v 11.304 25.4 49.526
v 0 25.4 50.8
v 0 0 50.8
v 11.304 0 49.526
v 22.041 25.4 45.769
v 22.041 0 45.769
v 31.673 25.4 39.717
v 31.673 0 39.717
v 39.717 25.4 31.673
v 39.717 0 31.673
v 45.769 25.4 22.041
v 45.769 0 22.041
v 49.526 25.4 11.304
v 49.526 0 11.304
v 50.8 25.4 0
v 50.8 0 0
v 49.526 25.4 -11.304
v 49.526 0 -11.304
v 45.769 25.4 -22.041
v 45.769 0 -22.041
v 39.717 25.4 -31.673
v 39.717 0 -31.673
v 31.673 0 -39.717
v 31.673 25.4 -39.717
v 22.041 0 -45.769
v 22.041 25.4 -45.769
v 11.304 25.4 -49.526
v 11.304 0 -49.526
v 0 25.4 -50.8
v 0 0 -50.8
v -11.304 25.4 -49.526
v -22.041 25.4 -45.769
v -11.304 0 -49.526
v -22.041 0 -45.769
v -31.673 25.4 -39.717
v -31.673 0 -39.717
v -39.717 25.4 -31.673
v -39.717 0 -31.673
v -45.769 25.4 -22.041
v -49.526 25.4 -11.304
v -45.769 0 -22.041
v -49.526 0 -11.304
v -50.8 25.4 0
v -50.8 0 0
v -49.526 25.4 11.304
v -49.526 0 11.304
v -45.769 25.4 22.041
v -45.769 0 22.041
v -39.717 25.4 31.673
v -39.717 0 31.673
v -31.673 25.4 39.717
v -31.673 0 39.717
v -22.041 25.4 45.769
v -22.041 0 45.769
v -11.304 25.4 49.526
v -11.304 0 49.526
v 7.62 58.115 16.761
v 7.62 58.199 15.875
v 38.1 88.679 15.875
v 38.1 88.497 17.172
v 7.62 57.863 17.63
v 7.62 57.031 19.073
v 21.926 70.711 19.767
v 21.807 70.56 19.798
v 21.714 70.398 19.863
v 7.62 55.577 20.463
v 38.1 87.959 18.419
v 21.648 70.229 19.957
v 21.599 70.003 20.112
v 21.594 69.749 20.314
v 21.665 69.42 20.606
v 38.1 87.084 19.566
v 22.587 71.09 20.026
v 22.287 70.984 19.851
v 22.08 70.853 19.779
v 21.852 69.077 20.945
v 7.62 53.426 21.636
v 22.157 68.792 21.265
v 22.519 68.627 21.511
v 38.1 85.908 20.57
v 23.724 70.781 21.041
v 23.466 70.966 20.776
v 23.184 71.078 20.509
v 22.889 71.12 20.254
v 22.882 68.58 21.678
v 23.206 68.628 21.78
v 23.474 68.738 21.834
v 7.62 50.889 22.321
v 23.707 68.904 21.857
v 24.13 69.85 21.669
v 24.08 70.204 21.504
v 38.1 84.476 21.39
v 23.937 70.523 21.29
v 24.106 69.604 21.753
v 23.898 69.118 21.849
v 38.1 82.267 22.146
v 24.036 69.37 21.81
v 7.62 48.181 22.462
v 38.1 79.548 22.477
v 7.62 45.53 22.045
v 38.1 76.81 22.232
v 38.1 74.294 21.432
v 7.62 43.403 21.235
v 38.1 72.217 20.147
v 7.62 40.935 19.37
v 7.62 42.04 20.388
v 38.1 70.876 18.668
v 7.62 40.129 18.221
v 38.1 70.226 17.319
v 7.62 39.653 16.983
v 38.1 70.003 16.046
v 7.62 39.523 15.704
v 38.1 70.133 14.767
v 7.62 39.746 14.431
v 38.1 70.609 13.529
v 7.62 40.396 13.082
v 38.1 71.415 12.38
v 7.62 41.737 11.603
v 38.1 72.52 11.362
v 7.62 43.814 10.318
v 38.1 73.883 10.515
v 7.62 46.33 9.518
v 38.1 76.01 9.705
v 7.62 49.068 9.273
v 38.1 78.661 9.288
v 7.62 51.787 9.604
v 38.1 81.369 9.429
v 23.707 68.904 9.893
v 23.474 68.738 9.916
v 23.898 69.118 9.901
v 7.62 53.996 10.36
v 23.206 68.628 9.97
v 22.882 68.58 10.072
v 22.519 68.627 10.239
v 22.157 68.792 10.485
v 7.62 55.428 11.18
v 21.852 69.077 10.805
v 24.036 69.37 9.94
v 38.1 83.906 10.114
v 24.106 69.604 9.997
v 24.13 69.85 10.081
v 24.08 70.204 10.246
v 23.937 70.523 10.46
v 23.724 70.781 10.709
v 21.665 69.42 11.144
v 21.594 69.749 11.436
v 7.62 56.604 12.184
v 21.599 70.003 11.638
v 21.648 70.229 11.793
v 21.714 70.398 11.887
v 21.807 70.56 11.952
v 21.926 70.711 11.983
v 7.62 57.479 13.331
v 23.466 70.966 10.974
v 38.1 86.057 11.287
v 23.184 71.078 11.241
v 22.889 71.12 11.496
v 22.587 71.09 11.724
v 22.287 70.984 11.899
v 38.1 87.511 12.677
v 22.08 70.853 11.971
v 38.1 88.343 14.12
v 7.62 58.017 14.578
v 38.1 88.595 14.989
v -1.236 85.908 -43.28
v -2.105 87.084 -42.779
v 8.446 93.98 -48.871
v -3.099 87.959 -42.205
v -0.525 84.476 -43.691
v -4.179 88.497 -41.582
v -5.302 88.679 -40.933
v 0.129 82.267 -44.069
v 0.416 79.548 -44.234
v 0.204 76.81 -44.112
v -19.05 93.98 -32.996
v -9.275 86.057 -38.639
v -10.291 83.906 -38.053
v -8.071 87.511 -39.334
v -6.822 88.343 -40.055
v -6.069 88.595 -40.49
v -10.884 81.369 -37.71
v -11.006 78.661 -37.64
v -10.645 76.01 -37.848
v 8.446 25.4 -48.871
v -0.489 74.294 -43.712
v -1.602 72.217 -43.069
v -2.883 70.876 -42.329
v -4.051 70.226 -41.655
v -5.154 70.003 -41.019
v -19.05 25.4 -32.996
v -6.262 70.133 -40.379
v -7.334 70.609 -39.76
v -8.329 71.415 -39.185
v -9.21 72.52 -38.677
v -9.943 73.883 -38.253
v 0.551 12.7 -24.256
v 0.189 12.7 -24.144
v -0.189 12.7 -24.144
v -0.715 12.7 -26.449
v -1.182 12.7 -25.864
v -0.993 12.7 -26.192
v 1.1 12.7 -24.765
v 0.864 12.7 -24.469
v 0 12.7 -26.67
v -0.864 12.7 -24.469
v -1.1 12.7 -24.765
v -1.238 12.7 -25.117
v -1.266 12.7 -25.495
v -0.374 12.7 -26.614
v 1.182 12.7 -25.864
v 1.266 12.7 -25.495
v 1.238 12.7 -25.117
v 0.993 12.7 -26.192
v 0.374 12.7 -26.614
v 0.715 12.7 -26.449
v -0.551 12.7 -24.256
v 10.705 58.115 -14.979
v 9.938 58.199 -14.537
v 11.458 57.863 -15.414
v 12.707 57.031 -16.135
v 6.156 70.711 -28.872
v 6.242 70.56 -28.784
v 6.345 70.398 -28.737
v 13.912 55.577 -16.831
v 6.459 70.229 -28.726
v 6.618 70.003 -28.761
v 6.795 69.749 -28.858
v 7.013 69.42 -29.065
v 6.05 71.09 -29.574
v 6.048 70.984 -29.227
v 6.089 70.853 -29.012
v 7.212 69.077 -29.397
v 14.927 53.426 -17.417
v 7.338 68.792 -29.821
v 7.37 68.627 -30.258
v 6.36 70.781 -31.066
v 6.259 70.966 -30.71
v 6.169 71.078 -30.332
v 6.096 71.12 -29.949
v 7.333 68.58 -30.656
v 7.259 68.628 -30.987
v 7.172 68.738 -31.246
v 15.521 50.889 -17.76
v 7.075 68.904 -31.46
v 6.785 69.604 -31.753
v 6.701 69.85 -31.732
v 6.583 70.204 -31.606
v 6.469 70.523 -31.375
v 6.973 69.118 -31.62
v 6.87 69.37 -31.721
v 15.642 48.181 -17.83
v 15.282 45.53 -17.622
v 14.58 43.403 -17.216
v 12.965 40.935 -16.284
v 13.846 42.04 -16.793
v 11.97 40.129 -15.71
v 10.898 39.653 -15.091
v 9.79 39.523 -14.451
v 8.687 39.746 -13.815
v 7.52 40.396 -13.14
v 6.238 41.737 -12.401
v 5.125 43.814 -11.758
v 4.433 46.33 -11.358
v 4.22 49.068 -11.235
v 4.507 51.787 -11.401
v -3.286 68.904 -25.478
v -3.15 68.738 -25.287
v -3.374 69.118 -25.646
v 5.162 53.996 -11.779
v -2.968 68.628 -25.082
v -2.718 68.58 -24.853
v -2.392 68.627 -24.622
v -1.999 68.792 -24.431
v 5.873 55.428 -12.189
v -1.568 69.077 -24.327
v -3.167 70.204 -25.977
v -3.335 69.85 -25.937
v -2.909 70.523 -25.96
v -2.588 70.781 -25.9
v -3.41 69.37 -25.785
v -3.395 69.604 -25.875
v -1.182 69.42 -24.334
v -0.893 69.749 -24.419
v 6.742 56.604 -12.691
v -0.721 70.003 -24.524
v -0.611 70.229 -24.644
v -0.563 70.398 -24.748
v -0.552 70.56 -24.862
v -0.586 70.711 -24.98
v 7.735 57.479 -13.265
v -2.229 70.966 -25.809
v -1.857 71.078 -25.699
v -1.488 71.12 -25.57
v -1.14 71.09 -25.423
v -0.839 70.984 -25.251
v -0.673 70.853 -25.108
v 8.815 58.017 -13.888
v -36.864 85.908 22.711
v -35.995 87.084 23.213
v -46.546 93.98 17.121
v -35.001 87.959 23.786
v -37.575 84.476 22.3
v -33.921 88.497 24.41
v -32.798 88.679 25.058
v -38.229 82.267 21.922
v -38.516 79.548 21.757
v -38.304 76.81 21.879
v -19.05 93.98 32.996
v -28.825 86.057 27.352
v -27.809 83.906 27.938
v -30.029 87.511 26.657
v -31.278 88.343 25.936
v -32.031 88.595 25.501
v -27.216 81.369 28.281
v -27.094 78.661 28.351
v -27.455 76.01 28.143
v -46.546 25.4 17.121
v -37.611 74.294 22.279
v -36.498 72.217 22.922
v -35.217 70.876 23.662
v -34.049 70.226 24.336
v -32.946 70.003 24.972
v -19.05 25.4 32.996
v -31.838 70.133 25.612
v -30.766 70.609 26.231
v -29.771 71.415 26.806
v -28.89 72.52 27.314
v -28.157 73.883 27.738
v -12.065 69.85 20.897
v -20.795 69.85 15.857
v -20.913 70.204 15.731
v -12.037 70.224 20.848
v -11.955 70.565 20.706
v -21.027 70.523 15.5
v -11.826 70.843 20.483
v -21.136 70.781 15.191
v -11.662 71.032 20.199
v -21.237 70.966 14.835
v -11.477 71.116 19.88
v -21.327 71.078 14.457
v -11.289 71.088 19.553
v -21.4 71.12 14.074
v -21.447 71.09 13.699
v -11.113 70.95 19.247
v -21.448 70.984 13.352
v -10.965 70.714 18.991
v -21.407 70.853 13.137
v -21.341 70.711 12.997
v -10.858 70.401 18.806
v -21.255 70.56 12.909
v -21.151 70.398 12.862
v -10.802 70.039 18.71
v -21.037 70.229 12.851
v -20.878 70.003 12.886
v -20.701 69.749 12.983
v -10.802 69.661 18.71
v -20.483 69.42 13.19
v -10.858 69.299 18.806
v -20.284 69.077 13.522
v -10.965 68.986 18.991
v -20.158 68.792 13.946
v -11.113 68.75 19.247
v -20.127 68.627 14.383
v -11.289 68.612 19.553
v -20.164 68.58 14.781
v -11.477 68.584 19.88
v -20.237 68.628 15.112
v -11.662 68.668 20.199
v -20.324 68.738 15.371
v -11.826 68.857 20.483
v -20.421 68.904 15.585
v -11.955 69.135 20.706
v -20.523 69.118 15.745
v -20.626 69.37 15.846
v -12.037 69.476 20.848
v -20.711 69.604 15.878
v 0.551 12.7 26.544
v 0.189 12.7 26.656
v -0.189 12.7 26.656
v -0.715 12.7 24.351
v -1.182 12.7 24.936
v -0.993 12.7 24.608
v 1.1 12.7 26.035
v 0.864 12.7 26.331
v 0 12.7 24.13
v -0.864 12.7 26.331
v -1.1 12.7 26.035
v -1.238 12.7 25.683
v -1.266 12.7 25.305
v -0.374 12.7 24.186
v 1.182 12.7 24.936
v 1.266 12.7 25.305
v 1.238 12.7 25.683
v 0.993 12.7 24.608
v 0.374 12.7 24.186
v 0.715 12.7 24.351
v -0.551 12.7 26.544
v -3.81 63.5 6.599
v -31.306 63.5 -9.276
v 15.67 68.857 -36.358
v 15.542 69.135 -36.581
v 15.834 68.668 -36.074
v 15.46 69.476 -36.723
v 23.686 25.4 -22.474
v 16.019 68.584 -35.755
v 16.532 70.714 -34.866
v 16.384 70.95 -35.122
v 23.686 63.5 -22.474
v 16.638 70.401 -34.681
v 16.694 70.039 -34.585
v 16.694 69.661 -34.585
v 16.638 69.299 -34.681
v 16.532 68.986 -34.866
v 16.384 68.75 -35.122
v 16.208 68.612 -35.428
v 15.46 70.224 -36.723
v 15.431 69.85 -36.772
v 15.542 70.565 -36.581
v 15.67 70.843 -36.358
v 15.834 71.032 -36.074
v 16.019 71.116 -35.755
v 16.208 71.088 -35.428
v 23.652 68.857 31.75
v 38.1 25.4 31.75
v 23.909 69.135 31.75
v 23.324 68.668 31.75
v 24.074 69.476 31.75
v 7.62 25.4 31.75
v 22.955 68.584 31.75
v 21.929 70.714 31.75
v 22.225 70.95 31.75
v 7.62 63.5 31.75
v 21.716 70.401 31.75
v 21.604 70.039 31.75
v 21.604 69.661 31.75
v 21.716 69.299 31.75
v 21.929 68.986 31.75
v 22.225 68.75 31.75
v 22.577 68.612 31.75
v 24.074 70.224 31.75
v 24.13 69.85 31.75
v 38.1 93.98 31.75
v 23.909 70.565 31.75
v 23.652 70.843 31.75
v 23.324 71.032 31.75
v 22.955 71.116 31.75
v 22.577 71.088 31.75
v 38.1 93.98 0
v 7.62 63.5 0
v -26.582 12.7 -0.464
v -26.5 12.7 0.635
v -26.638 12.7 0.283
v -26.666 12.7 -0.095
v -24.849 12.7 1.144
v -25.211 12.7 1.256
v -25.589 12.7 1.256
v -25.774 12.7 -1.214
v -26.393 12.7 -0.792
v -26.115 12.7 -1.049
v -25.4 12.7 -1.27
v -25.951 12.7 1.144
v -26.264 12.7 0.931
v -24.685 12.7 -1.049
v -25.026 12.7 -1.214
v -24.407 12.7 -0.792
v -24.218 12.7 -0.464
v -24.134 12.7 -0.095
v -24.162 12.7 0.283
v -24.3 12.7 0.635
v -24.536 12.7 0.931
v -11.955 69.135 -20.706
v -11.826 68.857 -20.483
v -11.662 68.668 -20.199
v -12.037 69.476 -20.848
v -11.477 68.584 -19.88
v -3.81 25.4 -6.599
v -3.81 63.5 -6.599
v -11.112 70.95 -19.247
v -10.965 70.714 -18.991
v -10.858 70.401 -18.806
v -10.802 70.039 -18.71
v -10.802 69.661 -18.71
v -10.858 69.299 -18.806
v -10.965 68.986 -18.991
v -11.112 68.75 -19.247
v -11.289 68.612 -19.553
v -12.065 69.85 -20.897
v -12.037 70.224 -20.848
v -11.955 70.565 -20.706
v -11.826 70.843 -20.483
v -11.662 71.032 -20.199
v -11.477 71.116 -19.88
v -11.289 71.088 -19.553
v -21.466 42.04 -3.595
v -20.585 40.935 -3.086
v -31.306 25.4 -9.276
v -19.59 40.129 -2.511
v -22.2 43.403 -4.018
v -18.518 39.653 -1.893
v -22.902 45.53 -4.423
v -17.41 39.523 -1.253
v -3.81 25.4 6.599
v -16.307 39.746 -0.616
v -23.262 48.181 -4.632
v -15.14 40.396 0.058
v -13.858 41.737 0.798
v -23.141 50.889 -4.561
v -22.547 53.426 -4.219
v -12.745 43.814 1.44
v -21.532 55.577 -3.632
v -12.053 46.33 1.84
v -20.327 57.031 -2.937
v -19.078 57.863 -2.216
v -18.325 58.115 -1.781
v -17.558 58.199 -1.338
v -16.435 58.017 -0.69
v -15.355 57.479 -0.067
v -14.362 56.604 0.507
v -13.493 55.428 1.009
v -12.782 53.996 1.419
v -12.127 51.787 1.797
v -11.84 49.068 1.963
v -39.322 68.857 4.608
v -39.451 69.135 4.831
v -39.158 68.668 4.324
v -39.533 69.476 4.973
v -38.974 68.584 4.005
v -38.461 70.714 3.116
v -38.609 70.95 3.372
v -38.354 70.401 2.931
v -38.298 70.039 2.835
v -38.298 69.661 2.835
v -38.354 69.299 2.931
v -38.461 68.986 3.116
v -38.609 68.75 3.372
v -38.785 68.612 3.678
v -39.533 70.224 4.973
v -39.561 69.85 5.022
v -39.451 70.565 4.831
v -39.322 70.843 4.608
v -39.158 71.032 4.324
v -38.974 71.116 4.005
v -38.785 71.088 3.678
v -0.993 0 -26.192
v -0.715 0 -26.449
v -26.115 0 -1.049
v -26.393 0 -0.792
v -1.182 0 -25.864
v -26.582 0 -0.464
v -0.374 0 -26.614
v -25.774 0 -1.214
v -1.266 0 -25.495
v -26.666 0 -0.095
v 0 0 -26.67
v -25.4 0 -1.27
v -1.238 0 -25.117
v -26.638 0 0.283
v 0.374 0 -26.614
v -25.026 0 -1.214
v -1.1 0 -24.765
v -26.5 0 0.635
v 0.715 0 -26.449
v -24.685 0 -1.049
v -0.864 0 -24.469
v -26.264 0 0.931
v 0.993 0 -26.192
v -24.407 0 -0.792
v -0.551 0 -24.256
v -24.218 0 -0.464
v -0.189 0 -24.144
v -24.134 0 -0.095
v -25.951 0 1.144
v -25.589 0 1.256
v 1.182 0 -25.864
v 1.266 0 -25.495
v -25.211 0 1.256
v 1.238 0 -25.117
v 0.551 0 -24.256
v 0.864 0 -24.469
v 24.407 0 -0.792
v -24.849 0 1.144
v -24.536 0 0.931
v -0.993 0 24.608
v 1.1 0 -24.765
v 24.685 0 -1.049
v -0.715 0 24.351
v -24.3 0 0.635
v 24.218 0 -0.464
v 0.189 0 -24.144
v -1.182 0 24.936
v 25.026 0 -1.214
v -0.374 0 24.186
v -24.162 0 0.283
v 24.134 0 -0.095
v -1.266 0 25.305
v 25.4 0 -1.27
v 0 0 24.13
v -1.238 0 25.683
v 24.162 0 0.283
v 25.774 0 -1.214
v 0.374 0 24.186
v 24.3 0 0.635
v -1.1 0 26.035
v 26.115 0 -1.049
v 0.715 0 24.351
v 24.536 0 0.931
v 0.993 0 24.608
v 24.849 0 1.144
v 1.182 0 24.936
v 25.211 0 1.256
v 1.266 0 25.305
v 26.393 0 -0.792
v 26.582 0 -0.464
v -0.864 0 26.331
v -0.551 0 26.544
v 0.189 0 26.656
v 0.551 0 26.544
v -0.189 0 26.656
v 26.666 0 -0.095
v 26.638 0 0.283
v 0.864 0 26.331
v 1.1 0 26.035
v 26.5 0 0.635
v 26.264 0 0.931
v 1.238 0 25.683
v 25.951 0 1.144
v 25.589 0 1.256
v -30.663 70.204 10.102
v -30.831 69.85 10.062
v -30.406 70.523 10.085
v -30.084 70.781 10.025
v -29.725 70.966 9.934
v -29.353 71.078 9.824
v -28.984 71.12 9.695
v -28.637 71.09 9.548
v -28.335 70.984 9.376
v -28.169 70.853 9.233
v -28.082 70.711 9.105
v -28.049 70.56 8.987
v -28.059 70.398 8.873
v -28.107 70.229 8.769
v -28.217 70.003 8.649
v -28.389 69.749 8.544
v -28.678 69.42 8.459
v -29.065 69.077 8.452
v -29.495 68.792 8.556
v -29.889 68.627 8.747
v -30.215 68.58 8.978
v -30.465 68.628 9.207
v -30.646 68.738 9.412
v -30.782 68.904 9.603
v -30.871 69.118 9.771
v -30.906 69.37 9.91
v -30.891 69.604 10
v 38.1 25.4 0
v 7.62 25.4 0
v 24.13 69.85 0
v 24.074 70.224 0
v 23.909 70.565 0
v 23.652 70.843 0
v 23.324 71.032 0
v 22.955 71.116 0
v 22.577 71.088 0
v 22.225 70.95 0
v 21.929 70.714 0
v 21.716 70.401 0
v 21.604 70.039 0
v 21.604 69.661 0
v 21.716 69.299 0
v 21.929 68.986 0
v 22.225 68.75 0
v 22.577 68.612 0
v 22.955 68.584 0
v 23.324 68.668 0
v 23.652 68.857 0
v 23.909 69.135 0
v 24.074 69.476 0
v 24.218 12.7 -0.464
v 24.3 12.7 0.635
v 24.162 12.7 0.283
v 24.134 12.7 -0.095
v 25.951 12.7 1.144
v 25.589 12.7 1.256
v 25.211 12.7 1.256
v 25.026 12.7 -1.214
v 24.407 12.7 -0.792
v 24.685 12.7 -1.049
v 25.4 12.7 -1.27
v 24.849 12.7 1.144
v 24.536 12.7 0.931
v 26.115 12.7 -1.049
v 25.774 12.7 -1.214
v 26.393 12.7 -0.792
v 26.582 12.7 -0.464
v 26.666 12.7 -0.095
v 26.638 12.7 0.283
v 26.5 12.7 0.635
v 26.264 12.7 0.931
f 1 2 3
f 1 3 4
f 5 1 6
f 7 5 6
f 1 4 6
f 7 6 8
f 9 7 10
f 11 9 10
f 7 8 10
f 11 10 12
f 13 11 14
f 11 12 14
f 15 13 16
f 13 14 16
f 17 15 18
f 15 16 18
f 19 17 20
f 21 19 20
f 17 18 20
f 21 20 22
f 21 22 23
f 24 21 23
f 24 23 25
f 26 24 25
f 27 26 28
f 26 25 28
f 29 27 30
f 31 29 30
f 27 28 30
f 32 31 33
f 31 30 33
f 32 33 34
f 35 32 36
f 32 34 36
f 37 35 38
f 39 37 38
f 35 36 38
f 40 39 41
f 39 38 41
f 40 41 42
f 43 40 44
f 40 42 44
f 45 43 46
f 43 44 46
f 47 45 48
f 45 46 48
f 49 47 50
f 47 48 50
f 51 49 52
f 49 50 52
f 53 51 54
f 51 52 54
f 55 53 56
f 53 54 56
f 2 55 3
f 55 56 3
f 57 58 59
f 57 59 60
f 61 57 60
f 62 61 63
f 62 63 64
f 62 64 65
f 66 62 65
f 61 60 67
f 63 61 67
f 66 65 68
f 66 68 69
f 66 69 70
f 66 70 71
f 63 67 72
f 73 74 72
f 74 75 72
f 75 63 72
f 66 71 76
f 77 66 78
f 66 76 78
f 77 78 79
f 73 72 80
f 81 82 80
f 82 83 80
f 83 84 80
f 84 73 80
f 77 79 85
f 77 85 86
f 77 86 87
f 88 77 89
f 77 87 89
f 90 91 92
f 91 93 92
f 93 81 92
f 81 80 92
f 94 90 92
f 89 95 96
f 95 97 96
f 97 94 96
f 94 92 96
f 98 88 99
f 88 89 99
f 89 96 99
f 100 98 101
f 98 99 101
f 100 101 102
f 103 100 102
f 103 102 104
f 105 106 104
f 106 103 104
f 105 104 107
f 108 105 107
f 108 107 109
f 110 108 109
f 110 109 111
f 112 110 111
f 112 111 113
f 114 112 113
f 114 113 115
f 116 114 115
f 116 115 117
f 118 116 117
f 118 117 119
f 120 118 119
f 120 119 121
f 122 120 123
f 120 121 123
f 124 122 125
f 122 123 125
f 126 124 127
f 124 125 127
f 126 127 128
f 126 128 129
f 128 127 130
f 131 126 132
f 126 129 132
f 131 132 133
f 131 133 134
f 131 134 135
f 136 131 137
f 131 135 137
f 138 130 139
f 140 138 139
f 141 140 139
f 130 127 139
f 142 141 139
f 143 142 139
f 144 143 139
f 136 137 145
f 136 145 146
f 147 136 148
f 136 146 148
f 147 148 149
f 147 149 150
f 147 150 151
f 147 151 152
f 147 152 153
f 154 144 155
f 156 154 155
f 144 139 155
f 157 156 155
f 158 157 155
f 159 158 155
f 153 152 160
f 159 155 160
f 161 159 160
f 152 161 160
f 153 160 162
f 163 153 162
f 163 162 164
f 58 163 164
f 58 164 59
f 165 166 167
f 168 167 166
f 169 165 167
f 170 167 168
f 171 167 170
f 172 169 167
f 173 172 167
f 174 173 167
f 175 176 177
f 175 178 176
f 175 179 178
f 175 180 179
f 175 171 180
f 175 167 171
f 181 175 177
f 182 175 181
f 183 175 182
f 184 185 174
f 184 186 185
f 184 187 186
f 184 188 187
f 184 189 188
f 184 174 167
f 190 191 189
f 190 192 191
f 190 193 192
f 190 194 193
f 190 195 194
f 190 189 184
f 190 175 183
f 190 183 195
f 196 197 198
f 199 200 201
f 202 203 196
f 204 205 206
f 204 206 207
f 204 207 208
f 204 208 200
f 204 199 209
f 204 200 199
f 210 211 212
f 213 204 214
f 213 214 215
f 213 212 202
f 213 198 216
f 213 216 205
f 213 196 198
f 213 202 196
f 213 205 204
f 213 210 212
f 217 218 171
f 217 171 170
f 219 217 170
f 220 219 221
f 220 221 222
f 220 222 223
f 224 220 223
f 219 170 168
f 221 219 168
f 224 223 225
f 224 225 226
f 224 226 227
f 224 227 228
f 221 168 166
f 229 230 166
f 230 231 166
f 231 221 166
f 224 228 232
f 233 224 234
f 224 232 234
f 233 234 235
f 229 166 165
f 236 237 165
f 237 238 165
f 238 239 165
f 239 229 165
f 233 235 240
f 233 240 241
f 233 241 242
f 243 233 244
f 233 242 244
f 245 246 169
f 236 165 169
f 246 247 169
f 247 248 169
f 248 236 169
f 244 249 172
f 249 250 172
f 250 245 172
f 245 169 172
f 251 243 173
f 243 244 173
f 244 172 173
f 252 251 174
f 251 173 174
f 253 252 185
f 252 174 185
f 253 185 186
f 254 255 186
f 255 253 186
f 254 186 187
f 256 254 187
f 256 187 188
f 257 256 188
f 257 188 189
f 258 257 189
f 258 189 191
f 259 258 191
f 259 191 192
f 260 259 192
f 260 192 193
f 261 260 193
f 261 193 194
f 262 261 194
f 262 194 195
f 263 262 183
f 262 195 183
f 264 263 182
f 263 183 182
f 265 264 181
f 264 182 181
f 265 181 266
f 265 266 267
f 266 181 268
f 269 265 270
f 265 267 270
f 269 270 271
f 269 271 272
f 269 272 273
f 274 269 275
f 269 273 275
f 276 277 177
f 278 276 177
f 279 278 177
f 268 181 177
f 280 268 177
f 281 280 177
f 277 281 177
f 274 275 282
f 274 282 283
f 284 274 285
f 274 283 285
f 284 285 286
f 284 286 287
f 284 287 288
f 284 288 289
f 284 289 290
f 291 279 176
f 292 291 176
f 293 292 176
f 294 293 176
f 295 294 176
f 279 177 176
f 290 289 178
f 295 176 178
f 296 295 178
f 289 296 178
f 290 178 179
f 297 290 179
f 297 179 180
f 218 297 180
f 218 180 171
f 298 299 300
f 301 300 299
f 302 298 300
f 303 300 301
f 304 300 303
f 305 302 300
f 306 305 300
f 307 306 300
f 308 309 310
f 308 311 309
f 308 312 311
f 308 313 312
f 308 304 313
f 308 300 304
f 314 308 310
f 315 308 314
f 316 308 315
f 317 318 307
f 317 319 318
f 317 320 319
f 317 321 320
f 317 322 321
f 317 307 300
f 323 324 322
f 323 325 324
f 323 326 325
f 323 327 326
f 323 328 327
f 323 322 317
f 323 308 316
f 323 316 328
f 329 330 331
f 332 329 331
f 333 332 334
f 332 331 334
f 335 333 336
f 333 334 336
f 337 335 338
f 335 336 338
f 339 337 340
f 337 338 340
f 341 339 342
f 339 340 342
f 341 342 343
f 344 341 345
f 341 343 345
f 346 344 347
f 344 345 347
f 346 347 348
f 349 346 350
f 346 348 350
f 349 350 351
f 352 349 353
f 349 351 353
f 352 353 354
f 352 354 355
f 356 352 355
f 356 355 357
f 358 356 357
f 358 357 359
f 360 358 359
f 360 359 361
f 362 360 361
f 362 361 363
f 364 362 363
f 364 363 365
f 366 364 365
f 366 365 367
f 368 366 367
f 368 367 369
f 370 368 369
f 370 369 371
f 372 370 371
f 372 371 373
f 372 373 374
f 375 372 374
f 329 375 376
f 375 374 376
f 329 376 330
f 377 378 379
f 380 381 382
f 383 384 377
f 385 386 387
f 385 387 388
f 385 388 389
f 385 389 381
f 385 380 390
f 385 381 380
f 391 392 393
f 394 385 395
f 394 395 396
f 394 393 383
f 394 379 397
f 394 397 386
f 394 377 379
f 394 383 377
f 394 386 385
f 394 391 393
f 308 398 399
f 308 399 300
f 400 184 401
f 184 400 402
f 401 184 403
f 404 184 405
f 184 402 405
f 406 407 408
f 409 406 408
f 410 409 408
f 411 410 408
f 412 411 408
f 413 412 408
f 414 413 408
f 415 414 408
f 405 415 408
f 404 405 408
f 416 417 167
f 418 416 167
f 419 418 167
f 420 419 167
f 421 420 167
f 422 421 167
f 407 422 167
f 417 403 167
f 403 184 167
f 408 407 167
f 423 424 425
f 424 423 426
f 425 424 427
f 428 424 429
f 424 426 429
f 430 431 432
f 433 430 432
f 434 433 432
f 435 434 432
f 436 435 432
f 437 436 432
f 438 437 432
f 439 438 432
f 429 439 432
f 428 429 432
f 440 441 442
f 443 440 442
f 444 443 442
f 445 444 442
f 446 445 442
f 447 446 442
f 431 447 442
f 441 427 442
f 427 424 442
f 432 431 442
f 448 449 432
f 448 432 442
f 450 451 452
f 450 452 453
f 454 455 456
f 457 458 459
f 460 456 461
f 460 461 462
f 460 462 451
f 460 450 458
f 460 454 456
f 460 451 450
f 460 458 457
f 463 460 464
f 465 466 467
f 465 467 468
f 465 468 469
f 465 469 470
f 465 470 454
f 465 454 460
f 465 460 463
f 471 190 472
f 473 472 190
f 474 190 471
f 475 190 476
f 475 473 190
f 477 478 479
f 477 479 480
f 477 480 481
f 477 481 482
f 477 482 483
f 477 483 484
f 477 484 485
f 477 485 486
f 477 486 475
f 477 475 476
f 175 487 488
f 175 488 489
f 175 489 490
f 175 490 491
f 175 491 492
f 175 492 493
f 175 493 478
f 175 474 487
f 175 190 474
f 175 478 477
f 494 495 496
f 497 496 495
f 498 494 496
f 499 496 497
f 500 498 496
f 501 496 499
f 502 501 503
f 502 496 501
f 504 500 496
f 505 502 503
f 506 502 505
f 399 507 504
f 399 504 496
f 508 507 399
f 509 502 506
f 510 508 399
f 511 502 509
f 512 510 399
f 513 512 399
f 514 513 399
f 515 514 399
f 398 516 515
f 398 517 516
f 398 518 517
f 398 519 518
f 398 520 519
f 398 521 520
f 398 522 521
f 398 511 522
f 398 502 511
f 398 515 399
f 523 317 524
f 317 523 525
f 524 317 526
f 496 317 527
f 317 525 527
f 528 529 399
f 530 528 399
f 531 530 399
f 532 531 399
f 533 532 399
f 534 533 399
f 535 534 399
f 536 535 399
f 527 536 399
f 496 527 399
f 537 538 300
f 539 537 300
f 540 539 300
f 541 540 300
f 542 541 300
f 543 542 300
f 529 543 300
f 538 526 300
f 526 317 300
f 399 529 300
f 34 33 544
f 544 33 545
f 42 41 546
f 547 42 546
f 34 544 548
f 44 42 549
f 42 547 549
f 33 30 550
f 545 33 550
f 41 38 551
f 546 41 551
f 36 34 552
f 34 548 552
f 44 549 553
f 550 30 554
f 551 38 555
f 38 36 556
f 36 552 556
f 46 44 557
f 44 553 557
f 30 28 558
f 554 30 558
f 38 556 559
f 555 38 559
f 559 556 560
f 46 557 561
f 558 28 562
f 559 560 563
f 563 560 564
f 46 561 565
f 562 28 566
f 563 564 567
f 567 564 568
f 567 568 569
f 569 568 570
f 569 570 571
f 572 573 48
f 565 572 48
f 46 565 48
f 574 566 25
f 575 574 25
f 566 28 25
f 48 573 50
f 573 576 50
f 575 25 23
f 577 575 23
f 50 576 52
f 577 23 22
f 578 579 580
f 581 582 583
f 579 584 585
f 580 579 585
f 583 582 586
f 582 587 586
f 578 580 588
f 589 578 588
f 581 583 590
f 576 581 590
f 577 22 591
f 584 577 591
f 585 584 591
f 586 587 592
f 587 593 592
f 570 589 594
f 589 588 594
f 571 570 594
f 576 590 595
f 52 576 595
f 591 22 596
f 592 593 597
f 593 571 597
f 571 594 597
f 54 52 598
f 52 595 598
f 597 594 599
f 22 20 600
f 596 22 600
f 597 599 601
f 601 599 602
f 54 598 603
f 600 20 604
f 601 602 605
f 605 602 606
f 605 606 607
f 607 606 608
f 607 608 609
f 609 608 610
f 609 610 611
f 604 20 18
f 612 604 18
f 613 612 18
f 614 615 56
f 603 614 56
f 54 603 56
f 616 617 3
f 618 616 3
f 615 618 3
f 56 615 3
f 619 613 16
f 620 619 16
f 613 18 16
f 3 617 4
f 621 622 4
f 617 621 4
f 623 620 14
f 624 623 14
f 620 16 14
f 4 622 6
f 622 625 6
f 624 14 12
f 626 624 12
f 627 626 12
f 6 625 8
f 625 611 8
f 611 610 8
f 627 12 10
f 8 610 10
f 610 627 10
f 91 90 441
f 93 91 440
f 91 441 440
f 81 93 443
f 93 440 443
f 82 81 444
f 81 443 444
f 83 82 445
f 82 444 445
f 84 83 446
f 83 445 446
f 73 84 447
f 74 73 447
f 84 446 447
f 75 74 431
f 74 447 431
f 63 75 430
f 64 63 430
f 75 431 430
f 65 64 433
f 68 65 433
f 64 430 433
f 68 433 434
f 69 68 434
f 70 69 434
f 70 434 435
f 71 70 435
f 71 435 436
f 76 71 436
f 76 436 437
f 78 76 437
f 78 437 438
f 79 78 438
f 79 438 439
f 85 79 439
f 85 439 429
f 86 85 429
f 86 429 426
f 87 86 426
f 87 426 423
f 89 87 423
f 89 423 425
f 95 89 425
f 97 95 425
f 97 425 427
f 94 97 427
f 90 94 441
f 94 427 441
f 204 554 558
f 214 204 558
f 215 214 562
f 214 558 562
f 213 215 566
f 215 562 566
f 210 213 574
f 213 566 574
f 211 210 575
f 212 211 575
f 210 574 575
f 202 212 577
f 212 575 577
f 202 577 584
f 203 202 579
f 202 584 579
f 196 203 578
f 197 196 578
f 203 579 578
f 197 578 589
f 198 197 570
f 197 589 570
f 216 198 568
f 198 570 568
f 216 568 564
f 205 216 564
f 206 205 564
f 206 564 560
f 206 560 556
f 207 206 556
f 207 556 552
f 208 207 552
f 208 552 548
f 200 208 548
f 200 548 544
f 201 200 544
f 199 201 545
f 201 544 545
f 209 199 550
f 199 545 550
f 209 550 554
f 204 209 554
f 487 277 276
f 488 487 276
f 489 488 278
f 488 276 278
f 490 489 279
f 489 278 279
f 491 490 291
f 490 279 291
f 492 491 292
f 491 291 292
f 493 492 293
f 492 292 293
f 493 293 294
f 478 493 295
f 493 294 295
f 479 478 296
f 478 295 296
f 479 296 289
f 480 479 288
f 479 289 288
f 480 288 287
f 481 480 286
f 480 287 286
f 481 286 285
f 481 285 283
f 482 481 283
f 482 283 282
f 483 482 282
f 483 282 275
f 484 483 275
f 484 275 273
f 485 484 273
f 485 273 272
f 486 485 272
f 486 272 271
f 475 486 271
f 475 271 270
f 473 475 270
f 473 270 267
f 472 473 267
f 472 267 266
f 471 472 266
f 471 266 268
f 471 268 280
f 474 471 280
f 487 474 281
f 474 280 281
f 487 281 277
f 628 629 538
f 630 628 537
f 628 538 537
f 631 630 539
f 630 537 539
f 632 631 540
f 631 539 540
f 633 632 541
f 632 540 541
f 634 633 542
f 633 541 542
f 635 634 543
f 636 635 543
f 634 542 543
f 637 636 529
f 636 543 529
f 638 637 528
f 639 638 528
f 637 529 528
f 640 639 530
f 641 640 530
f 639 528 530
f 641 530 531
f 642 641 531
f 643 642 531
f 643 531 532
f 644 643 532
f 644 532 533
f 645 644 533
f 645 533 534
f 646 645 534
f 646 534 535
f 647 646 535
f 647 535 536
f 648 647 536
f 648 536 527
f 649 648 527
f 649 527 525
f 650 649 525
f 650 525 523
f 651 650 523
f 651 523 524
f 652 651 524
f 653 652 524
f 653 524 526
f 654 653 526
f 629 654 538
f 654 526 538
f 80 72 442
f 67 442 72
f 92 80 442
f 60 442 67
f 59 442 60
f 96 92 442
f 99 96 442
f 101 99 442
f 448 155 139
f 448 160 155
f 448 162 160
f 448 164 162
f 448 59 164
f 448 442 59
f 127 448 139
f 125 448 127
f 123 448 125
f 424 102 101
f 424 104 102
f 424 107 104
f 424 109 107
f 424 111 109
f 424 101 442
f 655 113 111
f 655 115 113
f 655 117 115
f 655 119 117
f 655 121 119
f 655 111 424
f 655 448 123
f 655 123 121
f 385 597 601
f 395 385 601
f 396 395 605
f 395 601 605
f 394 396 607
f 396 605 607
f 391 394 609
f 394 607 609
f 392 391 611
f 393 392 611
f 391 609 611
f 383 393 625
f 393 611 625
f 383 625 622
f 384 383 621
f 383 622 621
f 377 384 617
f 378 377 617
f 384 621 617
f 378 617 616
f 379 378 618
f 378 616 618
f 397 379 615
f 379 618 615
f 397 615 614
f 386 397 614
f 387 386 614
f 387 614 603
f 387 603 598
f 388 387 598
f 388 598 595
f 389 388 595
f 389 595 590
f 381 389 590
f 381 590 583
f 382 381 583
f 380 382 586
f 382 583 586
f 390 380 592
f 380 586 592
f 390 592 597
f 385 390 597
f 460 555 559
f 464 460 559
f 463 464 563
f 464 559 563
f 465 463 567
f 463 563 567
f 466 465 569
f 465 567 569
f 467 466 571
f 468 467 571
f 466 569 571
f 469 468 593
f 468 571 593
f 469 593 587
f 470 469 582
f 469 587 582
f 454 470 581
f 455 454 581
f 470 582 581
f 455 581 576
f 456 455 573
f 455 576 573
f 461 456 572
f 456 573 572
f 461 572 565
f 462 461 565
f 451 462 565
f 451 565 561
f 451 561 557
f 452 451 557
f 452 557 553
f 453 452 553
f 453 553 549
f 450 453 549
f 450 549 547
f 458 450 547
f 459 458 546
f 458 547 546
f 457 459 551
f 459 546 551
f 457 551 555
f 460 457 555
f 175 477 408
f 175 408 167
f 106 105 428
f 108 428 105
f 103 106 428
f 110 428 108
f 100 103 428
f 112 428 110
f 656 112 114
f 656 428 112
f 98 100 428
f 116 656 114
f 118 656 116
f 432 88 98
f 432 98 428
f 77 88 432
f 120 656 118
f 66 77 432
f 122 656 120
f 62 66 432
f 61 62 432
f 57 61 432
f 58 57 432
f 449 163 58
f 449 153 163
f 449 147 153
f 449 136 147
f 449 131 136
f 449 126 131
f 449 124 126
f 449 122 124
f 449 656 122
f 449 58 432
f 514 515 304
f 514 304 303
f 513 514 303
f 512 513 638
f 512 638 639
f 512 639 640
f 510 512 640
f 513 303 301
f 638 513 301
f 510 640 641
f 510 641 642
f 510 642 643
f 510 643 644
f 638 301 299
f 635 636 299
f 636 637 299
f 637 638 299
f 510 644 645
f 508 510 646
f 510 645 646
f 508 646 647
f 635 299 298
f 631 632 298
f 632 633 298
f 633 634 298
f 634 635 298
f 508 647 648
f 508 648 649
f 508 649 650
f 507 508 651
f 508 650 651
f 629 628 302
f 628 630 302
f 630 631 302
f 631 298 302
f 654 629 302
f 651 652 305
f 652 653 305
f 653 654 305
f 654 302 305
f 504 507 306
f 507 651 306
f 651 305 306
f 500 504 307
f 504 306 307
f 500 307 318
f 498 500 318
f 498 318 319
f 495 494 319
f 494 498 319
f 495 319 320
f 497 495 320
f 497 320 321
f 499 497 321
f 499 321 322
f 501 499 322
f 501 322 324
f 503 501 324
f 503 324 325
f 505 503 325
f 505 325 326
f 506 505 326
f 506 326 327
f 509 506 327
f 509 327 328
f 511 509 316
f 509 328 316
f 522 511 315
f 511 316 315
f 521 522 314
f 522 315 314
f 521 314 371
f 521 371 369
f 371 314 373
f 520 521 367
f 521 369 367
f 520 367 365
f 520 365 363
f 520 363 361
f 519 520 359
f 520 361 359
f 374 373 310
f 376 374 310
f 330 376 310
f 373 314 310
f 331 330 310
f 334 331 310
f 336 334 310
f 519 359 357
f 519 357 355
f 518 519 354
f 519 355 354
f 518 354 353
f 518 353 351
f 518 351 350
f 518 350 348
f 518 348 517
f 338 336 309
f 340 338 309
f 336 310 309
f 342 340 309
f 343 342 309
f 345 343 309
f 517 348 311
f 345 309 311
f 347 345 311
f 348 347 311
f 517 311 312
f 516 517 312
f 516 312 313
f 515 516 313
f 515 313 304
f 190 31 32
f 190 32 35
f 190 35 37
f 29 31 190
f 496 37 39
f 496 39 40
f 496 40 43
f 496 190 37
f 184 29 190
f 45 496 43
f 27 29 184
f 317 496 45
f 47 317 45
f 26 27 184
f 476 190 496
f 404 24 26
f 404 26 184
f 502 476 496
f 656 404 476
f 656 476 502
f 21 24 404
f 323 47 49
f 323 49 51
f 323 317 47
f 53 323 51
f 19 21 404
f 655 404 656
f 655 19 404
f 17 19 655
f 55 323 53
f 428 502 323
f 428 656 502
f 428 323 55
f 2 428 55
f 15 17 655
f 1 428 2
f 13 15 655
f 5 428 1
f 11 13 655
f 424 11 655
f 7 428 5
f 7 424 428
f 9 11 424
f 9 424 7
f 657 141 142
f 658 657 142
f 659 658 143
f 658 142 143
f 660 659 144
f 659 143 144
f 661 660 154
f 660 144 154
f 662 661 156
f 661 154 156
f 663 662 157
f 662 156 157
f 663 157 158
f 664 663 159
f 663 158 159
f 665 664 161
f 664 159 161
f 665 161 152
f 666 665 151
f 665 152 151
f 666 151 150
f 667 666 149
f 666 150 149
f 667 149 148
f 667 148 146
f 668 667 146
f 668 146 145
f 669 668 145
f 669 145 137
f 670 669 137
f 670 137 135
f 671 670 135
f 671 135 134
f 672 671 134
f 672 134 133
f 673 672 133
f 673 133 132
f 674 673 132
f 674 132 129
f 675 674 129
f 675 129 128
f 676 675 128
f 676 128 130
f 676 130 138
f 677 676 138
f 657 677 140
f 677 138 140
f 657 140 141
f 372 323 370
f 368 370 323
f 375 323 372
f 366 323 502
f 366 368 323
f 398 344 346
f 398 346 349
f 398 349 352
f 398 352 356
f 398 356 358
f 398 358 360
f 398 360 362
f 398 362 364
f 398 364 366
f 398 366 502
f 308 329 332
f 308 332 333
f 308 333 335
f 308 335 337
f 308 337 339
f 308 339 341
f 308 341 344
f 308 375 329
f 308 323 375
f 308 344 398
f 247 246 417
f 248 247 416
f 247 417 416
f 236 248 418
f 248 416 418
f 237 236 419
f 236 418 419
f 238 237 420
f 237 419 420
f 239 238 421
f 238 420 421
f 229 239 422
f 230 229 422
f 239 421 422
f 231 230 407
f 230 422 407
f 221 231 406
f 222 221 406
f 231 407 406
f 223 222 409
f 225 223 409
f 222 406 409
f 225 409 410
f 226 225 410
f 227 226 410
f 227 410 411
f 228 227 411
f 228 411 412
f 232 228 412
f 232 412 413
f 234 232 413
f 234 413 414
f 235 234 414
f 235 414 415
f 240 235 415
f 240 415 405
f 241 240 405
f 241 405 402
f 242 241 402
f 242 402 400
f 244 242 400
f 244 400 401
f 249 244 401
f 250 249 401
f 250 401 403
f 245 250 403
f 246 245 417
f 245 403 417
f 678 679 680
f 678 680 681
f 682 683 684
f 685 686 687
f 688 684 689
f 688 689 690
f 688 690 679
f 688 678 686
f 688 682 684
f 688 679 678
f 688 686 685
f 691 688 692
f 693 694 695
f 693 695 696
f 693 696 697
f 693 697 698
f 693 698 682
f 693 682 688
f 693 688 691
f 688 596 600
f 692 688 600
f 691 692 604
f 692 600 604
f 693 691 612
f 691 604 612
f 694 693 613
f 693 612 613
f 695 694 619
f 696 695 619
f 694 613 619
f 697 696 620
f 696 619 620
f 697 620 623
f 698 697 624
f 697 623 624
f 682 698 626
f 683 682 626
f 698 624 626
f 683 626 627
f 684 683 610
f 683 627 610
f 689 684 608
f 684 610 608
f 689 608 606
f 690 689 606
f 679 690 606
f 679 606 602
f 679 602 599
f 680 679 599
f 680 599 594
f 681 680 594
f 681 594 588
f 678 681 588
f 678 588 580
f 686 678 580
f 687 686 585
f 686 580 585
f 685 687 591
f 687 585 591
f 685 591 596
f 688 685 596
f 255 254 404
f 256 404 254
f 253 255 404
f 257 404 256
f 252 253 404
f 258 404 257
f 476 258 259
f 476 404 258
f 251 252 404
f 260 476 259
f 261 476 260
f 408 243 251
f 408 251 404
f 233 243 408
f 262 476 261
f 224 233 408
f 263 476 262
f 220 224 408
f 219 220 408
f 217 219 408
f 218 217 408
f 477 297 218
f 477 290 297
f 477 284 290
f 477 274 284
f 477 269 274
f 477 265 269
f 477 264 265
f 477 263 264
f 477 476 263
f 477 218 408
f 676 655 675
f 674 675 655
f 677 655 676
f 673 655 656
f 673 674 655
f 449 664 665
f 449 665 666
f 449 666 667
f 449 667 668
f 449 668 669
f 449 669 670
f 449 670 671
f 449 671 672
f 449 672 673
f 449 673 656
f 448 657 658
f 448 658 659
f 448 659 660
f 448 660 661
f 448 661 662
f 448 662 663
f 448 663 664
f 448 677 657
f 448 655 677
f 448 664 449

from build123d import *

# Parameters (mm, degrees)
SKETCH1_R           = 50.8
BOSS_EXTRUDE1_DEPTH = 25.4
SKETCH2_R           = 1.27
CUT_EXTRUDE1_DEPTH  = 12.7
BOSS_EXTRUDE2_DEPTH = 31.75
SKETCH9_R           = 6.604
CUT_EXTRUDE2_DEPTH  = 68.58
SKETCH10_R          = 1.27
CUT_EXTRUDE3_DEPTH  = 68.58
CIRPATTERN3_COUNT   = 3


with BuildPart() as part:
    # Sketch1 → Boss-Extrude1 (new body)
    with BuildSketch(Plane(origin=(0, 0, 0), x_dir=(1, 0, 0), z_dir=(0, 1, 0))):
        Circle(SKETCH1_R)
    extrude(amount=BOSS_EXTRUDE1_DEPTH)

    # Sketch2 → Cut-Extrude1 (cut)
    with BuildSketch(Plane.XZ):
        with Locations((-25.4, 0)):
            Circle(SKETCH2_R)
        with Locations((0, 25.4)):
            Circle(SKETCH2_R)
        with Locations((25.4, 0)):
            Circle(SKETCH2_R)
        with Locations((0, -25.4)):
            Circle(SKETCH2_R)
    extrude(amount=-CUT_EXTRUDE1_DEPTH, mode=Mode.SUBTRACT)

    # Sketch4 → Boss-Extrude2 (add)
    with BuildSketch(Plane.XY):
        Polygon((7.62, 25.4), (7.62, 63.5), (38.1, 93.98), (38.1, 25.4), align=None)
    boss_extrude2 = extrude(amount=BOSS_EXTRUDE2_DEPTH)

    # Sketch9 → Cut-Extrude2 (cut)
    with BuildSketch(Plane(origin=(66.802, 66.802, 0), x_dir=(0, 0, -1), z_dir=(0.7071067811865512, 0.7071067811865439, 0))):
        with Locations((-15.875, 29.160757667)):
            Circle(SKETCH9_R)
    cut_extrude2 = extrude(amount=-CUT_EXTRUDE2_DEPTH, mode=Mode.SUBTRACT)

    # Sketch10 → Cut-Extrude3 (cut)
    with BuildSketch(Plane.XY.offset(31.75)):
        with Locations((22.86, 69.85)):
            Circle(SKETCH10_R)
    cut_extrude3 = extrude(amount=-CUT_EXTRUDE3_DEPTH, mode=Mode.SUBTRACT)

    # CirPattern3: Boss-Extrude2, Cut-Extrude2, Cut-Extrude3 ×3 about axis
    cirpattern3_axis = Axis((0, 25.4, 0), (0, -1, 0))
    add([boss_extrude2.rotate(cirpattern3_axis, i * 360 / CIRPATTERN3_COUNT) for i in range(1, CIRPATTERN3_COUNT)])
    add([cut_extrude2.rotate(cirpattern3_axis, i * 360 / CIRPATTERN3_COUNT) for i in range(1, CIRPATTERN3_COUNT)], mode=Mode.SUBTRACT)
    add([cut_extrude3.rotate(cirpattern3_axis, i * 360 / CIRPATTERN3_COUNT) for i in range(1, CIRPATTERN3_COUNT)], mode=Mode.SUBTRACT)


solid = part.part
